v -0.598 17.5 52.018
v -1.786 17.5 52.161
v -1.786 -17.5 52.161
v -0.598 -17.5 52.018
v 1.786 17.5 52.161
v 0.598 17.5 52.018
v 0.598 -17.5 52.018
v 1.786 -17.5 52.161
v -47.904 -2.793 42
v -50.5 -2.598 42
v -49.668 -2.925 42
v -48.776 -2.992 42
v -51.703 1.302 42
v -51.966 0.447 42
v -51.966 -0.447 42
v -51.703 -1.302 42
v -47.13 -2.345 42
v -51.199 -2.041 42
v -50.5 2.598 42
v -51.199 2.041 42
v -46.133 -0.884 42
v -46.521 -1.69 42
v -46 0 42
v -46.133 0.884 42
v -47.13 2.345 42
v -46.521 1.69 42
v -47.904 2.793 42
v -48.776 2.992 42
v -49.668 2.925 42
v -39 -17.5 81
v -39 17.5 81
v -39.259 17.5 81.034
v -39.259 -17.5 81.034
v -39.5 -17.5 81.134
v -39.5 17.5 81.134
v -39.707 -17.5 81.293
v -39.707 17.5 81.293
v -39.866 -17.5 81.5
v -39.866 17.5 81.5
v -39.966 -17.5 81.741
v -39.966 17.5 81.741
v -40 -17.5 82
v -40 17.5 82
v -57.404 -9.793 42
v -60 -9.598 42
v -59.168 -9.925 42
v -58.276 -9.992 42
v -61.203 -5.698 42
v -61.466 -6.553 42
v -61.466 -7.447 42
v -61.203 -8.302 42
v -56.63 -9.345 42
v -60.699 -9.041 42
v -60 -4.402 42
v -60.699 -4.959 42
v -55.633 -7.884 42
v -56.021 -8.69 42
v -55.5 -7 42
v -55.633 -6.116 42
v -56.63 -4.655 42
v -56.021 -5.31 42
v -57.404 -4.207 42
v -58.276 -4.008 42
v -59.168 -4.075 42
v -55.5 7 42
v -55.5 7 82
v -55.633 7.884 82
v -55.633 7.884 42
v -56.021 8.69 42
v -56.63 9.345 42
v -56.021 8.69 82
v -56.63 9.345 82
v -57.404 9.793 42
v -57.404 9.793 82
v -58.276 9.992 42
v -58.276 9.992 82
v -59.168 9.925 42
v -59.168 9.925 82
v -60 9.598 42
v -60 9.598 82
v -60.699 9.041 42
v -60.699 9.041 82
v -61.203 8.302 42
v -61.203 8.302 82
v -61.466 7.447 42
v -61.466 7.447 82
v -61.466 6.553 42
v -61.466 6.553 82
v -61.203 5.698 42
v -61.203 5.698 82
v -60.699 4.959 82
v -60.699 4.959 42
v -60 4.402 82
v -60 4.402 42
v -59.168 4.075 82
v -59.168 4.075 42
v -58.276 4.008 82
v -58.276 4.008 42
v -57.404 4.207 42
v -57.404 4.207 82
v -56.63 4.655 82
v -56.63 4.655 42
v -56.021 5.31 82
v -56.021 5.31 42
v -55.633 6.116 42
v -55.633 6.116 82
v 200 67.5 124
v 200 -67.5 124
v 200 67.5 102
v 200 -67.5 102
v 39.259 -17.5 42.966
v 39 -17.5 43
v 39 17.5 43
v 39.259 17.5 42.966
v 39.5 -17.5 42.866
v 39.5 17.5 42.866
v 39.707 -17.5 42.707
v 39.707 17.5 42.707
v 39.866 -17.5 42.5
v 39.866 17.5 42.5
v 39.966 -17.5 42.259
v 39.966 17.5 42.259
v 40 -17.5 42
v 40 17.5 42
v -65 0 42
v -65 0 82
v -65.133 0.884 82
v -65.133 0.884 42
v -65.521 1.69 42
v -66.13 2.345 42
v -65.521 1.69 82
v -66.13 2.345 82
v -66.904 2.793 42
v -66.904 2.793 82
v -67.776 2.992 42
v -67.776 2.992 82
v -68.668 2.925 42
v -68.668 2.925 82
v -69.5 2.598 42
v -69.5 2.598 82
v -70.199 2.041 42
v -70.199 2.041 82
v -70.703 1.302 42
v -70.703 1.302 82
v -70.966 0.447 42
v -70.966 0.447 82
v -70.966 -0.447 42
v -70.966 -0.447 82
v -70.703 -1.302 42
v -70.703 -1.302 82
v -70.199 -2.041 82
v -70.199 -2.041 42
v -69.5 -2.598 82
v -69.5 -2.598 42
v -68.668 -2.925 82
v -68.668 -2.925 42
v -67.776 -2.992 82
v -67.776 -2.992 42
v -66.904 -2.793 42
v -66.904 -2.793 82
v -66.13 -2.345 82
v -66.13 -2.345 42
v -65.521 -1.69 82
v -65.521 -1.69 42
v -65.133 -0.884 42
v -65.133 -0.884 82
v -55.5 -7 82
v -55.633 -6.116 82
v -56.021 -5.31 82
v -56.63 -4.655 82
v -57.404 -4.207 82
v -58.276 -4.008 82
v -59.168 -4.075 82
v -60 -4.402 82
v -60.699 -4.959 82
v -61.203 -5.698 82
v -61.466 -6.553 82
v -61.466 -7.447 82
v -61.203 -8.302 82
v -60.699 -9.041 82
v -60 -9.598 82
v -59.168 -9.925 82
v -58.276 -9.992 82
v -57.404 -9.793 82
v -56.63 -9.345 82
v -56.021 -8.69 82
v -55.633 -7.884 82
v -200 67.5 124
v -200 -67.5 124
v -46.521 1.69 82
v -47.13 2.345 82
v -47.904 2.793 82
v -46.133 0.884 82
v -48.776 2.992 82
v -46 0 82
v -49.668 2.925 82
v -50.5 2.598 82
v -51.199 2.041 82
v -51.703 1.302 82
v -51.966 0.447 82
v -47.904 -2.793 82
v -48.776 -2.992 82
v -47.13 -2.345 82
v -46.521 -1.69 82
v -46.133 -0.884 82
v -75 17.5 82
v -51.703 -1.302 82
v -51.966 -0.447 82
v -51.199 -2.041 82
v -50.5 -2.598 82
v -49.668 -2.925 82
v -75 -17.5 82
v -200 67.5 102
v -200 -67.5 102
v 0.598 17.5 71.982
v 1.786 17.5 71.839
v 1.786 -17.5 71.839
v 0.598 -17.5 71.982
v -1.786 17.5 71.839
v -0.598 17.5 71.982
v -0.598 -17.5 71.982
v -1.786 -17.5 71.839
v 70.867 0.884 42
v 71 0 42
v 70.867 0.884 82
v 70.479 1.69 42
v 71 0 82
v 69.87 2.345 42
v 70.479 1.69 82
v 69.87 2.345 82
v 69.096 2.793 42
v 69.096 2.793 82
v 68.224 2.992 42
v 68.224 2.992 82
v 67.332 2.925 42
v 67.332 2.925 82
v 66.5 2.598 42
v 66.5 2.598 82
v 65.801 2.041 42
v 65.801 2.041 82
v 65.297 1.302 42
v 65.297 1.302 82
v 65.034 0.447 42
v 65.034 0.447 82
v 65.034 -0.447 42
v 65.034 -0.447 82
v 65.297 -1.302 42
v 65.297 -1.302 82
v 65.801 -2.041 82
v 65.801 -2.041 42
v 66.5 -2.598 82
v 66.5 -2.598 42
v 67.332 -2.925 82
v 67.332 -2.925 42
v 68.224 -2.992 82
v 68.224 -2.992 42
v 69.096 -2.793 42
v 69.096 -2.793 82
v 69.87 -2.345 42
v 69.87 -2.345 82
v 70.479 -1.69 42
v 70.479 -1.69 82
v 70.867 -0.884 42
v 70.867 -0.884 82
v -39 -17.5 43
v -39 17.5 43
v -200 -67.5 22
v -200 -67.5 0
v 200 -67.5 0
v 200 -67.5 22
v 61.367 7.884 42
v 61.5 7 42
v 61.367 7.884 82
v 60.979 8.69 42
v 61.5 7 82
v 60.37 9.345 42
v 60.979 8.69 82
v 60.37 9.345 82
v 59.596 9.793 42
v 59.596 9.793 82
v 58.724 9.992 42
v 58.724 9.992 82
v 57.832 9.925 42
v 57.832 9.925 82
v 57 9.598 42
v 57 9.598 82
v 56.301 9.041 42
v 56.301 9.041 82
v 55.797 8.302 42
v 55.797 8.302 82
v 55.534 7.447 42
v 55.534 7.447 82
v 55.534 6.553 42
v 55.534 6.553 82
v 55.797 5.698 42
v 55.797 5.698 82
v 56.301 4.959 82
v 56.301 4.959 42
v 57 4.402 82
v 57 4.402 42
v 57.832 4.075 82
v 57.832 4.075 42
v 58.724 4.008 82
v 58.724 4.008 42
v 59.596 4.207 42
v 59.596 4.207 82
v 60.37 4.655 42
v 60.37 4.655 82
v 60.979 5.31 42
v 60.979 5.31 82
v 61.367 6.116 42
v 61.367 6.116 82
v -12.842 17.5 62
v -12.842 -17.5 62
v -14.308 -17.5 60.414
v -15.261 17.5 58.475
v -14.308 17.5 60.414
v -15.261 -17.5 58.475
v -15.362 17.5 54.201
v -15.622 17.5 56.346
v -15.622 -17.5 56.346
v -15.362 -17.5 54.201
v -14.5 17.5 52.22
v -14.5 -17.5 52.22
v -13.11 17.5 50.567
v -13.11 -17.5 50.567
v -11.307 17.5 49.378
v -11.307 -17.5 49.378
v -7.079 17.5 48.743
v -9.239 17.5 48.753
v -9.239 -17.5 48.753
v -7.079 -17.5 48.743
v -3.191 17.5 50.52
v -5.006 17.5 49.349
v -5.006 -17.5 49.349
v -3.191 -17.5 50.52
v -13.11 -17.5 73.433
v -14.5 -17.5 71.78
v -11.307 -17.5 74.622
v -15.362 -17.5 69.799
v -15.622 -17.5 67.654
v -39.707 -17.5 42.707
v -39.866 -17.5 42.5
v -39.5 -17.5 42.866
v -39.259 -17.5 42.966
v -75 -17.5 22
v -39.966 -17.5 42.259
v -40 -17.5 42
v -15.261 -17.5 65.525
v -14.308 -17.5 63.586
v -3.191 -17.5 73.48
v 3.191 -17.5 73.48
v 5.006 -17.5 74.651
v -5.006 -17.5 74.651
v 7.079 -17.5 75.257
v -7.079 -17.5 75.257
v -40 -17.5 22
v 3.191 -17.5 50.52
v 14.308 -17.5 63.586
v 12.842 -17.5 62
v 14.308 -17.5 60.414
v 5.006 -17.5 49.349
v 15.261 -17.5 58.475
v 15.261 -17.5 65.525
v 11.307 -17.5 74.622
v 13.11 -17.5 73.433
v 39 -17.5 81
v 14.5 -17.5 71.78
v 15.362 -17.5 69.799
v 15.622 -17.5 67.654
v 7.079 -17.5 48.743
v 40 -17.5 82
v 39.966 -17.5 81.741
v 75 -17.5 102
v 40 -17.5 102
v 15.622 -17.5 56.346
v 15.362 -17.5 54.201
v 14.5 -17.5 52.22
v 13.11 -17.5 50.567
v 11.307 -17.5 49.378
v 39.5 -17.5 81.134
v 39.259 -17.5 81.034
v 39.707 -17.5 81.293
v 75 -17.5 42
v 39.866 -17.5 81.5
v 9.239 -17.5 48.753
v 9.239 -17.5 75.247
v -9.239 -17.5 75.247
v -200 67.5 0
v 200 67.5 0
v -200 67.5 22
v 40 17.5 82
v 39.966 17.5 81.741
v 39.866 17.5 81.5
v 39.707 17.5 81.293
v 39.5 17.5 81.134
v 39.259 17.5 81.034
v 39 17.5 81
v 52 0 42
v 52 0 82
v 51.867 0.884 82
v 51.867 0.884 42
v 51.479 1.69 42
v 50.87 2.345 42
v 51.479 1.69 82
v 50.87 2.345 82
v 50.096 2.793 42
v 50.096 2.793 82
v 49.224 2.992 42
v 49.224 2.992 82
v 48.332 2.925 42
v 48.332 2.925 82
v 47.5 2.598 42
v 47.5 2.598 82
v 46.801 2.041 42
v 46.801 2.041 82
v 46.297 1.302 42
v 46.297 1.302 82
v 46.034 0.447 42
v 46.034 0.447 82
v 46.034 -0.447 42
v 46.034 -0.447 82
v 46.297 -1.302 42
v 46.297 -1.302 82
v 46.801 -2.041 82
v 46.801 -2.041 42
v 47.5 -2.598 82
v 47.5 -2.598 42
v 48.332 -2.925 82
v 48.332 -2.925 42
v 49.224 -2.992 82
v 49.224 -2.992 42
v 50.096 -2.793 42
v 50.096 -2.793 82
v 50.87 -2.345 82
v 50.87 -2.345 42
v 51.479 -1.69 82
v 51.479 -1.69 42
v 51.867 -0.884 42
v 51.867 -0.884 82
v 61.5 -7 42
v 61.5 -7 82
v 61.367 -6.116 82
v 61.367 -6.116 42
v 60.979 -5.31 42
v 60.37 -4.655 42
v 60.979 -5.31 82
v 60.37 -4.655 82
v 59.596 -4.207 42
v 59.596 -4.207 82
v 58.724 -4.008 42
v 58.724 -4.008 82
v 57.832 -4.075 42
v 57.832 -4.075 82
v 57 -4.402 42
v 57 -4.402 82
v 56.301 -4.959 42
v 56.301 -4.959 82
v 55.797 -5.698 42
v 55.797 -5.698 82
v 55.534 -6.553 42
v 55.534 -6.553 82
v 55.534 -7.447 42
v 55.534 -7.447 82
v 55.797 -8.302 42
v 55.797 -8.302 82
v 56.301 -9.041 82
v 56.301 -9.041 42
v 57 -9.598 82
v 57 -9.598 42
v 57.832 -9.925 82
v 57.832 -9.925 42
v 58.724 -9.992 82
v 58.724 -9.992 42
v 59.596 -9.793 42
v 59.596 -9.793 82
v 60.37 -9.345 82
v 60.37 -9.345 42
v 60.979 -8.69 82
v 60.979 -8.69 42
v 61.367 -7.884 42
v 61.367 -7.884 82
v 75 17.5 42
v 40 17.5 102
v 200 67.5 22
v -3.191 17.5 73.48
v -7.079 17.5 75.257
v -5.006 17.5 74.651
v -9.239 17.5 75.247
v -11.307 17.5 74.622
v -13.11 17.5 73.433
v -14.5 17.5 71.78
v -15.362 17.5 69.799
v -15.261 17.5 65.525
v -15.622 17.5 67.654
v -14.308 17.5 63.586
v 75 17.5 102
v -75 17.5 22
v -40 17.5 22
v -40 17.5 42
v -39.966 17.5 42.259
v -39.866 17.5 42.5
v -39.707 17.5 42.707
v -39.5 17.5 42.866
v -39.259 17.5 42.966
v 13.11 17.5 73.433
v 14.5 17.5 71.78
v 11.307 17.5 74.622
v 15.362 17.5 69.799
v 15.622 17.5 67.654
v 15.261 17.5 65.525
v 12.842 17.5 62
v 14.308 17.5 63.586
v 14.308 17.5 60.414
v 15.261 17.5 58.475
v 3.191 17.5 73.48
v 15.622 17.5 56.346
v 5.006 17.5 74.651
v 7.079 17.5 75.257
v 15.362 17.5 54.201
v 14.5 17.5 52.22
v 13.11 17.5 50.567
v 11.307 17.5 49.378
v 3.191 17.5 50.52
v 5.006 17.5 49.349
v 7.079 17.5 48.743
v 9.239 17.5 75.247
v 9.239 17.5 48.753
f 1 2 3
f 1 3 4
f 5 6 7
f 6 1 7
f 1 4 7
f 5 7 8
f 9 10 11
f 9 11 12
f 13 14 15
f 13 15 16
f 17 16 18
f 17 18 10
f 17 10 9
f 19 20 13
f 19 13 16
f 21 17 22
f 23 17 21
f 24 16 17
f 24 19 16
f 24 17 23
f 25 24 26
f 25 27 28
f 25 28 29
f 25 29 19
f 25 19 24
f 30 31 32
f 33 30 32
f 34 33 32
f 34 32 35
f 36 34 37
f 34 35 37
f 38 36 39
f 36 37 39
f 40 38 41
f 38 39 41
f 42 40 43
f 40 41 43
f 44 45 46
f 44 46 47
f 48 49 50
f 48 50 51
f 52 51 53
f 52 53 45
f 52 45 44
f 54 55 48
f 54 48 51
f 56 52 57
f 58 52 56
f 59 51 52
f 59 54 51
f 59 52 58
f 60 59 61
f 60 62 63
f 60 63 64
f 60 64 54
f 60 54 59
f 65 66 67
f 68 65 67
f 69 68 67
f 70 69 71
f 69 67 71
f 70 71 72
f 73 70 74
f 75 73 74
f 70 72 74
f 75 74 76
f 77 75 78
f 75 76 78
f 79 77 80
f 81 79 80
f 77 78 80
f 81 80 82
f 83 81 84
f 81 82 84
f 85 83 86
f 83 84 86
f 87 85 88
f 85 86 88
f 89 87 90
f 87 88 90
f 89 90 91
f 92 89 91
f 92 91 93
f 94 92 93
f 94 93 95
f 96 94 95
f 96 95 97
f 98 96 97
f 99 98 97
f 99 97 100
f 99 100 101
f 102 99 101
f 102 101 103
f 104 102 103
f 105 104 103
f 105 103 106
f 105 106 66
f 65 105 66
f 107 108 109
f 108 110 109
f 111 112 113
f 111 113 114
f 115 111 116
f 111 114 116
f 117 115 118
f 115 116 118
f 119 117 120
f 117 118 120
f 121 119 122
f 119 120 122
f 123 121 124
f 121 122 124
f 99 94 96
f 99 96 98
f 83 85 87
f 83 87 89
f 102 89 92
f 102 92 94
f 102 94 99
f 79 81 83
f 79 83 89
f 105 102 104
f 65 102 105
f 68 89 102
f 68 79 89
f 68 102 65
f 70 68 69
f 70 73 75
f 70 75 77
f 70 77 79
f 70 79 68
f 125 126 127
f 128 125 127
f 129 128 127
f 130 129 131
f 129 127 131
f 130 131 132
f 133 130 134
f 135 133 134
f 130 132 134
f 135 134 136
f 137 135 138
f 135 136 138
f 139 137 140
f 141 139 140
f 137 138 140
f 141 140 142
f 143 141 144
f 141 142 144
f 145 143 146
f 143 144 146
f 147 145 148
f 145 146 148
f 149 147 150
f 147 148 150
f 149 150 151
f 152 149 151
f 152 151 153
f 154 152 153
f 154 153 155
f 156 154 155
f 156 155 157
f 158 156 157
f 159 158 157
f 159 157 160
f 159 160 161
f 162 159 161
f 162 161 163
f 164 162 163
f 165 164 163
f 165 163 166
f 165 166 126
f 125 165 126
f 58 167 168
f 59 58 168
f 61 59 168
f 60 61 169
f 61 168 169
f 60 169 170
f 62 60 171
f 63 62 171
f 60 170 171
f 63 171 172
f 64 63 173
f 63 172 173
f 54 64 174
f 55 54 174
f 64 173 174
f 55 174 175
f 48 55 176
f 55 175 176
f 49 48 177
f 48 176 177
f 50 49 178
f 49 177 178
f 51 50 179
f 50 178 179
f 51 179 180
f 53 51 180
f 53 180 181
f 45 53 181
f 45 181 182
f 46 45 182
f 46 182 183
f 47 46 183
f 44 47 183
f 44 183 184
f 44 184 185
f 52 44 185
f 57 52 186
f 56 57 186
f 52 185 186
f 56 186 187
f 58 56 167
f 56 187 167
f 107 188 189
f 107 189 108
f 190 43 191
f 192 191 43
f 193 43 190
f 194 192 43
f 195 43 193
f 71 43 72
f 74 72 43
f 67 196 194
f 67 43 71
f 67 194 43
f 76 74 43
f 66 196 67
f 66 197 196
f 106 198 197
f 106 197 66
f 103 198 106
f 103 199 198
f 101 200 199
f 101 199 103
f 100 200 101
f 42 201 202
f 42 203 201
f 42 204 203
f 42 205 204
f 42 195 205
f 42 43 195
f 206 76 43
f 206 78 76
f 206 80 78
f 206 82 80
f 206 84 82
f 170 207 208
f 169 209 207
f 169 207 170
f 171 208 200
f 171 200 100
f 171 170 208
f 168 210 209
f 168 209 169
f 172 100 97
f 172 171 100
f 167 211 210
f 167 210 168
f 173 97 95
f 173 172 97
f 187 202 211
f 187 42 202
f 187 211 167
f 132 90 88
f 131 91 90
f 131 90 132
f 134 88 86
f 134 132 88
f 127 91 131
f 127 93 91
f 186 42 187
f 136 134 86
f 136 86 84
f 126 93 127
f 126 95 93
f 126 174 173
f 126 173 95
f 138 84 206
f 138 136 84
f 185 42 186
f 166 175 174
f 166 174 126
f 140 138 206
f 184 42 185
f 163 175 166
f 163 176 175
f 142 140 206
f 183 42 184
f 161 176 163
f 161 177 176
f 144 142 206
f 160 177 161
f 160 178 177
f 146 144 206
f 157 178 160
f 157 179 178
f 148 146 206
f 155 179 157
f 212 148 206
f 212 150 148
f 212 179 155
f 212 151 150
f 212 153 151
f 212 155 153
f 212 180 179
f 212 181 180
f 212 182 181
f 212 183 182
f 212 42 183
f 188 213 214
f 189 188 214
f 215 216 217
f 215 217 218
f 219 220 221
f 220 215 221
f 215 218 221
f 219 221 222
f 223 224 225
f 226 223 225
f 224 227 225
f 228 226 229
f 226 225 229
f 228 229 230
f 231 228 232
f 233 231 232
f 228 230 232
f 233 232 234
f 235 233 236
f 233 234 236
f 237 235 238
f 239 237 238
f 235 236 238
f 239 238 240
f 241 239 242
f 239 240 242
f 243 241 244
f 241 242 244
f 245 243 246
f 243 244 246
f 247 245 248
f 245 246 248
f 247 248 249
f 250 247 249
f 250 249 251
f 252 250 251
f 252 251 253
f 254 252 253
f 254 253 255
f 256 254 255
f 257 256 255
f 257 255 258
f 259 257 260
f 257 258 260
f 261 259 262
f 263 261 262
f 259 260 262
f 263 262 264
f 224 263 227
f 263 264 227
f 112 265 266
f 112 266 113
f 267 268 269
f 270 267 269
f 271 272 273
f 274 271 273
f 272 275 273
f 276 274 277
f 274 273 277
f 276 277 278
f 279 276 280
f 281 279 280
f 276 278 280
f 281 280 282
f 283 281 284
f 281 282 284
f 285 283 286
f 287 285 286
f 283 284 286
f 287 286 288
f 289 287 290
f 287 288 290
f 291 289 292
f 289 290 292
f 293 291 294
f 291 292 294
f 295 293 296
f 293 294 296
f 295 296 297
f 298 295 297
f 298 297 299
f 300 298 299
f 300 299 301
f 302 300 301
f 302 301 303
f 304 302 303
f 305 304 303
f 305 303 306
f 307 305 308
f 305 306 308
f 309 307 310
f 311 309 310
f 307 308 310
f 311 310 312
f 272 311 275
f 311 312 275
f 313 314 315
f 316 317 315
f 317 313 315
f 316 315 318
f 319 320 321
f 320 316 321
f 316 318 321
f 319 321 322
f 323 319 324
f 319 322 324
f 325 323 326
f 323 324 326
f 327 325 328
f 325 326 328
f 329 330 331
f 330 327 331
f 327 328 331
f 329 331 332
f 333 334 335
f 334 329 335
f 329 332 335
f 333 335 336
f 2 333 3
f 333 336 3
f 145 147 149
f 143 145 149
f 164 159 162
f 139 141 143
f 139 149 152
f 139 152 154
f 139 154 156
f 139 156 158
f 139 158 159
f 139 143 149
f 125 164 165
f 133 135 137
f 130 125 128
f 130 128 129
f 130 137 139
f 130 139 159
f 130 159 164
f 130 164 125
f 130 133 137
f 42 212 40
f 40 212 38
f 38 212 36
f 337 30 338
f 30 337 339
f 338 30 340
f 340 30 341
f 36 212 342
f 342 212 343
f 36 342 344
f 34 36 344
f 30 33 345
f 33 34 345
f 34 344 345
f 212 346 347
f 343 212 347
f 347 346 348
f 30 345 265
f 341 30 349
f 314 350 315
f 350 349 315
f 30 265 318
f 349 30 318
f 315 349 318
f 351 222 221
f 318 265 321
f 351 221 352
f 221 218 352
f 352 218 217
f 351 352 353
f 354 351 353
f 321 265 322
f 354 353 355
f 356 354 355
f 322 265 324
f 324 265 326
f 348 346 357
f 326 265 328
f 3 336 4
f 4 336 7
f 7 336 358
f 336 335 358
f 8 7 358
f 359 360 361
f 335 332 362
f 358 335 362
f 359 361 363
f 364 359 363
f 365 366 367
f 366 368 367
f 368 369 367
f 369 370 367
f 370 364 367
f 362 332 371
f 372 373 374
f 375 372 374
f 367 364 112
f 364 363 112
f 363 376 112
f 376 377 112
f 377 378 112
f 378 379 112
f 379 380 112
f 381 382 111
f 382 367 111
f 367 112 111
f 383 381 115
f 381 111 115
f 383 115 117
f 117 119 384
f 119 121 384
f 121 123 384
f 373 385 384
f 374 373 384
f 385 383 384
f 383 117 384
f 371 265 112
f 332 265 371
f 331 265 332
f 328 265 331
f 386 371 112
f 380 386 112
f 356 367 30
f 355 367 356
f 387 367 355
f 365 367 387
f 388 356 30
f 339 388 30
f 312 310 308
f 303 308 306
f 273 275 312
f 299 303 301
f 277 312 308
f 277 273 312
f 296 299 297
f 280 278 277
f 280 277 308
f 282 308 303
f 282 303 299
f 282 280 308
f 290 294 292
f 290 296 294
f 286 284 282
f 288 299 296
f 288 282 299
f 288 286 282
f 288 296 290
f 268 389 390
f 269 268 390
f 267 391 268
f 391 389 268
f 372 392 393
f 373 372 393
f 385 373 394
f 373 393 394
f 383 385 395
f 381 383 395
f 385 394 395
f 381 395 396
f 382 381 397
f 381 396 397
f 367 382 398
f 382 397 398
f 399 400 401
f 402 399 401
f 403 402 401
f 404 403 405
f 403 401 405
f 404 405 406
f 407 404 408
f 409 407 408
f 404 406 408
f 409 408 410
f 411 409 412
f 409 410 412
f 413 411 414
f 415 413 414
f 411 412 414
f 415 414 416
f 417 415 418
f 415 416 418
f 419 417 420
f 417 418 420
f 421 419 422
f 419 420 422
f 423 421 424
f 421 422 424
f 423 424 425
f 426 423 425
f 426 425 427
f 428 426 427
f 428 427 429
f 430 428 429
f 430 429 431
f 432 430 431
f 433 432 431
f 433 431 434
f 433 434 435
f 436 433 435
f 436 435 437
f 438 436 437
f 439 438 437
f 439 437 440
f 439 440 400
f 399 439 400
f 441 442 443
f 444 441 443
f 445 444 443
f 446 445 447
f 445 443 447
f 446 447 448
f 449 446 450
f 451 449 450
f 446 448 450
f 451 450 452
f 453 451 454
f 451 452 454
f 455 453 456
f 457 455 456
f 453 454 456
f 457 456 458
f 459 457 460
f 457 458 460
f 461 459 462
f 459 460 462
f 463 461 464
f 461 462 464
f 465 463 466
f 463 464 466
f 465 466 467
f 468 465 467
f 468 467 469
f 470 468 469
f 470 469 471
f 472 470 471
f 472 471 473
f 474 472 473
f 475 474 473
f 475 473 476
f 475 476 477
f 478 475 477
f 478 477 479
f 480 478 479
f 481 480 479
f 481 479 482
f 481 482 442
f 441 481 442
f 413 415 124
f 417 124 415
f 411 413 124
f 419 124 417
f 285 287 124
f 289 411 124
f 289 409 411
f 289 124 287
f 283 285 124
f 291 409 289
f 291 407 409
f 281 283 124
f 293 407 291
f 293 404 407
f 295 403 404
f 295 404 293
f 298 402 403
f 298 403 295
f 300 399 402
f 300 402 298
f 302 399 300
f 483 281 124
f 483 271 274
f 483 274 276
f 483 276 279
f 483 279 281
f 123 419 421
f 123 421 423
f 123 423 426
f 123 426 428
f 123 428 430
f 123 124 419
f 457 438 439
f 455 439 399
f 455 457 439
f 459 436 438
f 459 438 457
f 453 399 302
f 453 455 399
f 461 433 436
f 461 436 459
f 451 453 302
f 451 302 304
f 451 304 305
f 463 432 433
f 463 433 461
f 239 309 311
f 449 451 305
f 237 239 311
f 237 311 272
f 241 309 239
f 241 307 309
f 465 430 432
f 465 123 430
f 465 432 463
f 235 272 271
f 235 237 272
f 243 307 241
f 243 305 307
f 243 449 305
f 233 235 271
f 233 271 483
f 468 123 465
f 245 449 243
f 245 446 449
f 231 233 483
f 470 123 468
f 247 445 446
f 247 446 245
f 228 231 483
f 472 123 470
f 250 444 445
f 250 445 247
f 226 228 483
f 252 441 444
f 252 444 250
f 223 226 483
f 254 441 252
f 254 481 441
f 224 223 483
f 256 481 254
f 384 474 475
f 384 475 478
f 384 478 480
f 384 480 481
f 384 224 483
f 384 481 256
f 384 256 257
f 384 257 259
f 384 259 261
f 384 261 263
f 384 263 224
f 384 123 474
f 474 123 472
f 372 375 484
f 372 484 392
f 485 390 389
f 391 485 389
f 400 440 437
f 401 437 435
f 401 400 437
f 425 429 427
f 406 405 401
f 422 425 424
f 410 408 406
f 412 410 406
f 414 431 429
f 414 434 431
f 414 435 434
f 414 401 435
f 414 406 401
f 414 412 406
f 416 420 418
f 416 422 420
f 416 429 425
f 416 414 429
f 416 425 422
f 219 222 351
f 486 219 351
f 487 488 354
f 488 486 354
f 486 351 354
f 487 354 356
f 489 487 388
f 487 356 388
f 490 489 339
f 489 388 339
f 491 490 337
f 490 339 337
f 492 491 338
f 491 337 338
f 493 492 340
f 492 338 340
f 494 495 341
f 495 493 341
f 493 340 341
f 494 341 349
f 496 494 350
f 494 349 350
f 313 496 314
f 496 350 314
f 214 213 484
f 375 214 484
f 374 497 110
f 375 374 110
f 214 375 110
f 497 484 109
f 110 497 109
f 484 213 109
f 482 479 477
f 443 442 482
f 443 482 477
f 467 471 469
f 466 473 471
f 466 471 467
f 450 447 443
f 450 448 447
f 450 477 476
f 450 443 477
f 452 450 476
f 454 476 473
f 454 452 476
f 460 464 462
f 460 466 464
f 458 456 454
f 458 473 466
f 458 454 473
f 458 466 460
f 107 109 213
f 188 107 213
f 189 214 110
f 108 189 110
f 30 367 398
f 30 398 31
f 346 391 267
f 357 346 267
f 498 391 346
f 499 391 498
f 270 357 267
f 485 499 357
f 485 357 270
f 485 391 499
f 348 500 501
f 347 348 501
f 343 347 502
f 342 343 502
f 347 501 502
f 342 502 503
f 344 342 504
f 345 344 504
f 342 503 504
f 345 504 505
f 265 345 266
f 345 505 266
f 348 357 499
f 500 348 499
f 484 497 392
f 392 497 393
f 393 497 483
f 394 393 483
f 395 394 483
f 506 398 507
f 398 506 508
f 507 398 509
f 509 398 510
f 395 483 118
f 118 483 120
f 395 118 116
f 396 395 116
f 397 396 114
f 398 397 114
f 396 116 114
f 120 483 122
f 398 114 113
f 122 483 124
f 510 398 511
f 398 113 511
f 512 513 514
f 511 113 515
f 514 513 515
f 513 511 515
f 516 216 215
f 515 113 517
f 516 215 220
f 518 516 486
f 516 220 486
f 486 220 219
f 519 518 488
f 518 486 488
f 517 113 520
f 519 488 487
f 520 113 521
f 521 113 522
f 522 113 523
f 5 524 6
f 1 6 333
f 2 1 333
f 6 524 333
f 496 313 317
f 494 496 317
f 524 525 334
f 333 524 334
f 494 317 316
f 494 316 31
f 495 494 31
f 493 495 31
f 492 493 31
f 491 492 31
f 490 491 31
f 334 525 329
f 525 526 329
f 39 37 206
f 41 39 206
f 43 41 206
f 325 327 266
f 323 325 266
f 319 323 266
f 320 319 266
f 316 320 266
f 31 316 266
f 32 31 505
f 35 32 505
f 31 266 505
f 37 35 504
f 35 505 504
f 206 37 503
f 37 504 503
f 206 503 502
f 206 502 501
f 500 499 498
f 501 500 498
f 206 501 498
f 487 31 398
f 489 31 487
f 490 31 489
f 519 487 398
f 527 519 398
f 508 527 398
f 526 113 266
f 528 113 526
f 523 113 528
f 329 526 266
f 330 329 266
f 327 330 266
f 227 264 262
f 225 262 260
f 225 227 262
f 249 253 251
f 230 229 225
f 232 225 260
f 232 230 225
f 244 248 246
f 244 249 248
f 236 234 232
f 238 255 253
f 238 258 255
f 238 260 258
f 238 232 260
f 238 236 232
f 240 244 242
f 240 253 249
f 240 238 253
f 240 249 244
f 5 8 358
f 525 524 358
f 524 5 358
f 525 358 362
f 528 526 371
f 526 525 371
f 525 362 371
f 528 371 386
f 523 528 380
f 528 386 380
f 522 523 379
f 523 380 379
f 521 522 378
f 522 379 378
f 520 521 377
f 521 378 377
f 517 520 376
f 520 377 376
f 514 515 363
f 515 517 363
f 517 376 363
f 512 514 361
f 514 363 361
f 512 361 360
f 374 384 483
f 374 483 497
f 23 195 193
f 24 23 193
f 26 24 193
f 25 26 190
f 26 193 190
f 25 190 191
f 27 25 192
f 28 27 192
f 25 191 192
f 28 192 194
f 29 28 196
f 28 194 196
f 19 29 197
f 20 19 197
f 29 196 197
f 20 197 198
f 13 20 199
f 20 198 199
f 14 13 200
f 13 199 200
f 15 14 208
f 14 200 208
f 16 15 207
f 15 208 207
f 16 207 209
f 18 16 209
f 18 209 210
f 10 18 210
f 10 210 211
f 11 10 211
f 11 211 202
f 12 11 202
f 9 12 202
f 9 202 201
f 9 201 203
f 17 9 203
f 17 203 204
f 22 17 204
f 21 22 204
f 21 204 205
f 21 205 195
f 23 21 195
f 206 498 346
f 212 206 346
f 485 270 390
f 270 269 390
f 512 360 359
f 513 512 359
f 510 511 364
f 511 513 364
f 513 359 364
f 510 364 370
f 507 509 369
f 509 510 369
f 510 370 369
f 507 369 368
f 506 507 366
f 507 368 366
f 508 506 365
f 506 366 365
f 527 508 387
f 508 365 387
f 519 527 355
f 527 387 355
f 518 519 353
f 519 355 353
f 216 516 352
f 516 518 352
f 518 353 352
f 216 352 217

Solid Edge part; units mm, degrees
sketch "Sketch1" plane through (0, 0, 0) normal (0, 0, 1) x (1, 0, 0)
  line L0 (200, -67.5) -> (200, 67.5)
  line L1 (200, 67.5) -> (-200, 67.5)
  line L2 (-200, 67.5) -> (-200, -67.5)
  line L3 (-200, -67.5) -> (200, -67.5)
extrude "Protrusion1" add sketch "Sketch1" along normal blind 22
sketch "Sketch2" plane through (0, 0, 22) normal (0, 0, 1) x (0, 1, 0)
  line L0 (17.5, 75) -> (-17.5, 75)
  line L1 (-17.5, 75) -> (-17.5, 40)
  line L2 (-17.5, 40) -> (17.5, 40)
  line L3 (17.5, 40) -> (17.5, 75)
extrude "Extrusionsausprägung_2" add sketch "Sketch2" along normal blind 20
sketch "Sketch3" plane through (-57.5, -17.5, 32) normal (0, -1, 0) x (1, 0, 0)
  arc A0 (55.7143, 39.8393) -> (59.2857, 39.8393) centre (57.5, 30) cw
  arc A1 (59.2857, 39.8393) -> (70.342, 30) centre (65.6244, 35.8305) cw
  arc A2 (70.342, 30) -> (59.2857, 20.1607) centre (65.6244, 24.1695) cw
  arc A3 (59.2857, 20.1607) -> (55.7143, 20.1607) centre (57.5, 30) cw
  arc A4 (55.7143, 20.1607) -> (44.658, 30) centre (49.3756, 24.1695) cw
  arc A5 (44.658, 30) -> (55.7143, 39.8393) centre (49.3756, 35.8305) cw
  line L0 (17.5, 50) -> (-17.5, 50)
  line L1 (-17.5, 50) -> (-17.5, 10)
  line L2 (-17.5, 10) -> (17.5, 10)
  line L3 (17.5, 10) -> (17.5, 11)
  line L4 (17.5, 11) -> (97.5, 11)
  line L5 (97.5, 11) -> (97.5, 10)
  line L6 (97.5, 10) -> (132.5, 10)
  line L7 (132.5, 10) -> (132.5, 50)
  line L8 (132.5, 50) -> (97.5, 50)
  line L9 (97.5, 50) -> (97.5, 49)
  line L10 (97.5, 49) -> (17.5, 49)
  line L11 (17.5, 49) -> (17.5, 50)
extrude "Extrusionsausprägung_3" add sketch "Sketch3" against normal blind 35
fillet "Verrundung_1" radius 1 4 edges at (-40, 0, 81) (40, 0, 81) (-40, 0, 43) (40, 0, 43)
sketch "Sketch4" plane through (-57.5, 0, 82) normal (0, 0, 1) x (1, 0, 0)
  circle A0 centre (8.5, 0) radius 3
  circle A1 centre (-1, -7) radius 3
  circle A2 centre (-1, 7) radius 3
  circle A3 centre (-10.5, 0) radius 3
  circle A4 centre (106.5, 0) radius 3
  circle A5 centre (116, 7) radius 3
  circle A6 centre (125.5, 0) radius 3
  circle A7 centre (116, -7) radius 3
extrude "Extrusionsausschnitt_1" cut sketch "Sketch4" against normal blind 40
sketch "Sketch5" plane through (57.5, 0, 82) normal (0, 0, 1) x (1, 0, 0)
  line L0 (-17.5, -17.5) -> (-17.5, 17.5)
  line L1 (-17.5, 17.5) -> (17.5, 17.5)
  line L2 (17.5, 17.5) -> (17.5, -17.5)
  line L3 (17.5, -17.5) -> (-17.5, -17.5)
extrude "Extrusionsausprägung_4" add sketch "Sketch5" along normal blind 20
sketch "Sketch6" plane through (57.5, 0, 102) normal (0, 0, 1) x (1, 0, 0)
  line L0 (-257.5, -67.5) -> (142.5, -67.5)
  line L1 (142.5, -67.5) -> (142.5, 67.5)
  line L2 (142.5, 67.5) -> (-257.5, 67.5)
  line L3 (-257.5, 67.5) -> (-257.5, -67.5)
extrude "Extrusionsausprägung_5" add sketch "Sketch6" along normal blind 22
